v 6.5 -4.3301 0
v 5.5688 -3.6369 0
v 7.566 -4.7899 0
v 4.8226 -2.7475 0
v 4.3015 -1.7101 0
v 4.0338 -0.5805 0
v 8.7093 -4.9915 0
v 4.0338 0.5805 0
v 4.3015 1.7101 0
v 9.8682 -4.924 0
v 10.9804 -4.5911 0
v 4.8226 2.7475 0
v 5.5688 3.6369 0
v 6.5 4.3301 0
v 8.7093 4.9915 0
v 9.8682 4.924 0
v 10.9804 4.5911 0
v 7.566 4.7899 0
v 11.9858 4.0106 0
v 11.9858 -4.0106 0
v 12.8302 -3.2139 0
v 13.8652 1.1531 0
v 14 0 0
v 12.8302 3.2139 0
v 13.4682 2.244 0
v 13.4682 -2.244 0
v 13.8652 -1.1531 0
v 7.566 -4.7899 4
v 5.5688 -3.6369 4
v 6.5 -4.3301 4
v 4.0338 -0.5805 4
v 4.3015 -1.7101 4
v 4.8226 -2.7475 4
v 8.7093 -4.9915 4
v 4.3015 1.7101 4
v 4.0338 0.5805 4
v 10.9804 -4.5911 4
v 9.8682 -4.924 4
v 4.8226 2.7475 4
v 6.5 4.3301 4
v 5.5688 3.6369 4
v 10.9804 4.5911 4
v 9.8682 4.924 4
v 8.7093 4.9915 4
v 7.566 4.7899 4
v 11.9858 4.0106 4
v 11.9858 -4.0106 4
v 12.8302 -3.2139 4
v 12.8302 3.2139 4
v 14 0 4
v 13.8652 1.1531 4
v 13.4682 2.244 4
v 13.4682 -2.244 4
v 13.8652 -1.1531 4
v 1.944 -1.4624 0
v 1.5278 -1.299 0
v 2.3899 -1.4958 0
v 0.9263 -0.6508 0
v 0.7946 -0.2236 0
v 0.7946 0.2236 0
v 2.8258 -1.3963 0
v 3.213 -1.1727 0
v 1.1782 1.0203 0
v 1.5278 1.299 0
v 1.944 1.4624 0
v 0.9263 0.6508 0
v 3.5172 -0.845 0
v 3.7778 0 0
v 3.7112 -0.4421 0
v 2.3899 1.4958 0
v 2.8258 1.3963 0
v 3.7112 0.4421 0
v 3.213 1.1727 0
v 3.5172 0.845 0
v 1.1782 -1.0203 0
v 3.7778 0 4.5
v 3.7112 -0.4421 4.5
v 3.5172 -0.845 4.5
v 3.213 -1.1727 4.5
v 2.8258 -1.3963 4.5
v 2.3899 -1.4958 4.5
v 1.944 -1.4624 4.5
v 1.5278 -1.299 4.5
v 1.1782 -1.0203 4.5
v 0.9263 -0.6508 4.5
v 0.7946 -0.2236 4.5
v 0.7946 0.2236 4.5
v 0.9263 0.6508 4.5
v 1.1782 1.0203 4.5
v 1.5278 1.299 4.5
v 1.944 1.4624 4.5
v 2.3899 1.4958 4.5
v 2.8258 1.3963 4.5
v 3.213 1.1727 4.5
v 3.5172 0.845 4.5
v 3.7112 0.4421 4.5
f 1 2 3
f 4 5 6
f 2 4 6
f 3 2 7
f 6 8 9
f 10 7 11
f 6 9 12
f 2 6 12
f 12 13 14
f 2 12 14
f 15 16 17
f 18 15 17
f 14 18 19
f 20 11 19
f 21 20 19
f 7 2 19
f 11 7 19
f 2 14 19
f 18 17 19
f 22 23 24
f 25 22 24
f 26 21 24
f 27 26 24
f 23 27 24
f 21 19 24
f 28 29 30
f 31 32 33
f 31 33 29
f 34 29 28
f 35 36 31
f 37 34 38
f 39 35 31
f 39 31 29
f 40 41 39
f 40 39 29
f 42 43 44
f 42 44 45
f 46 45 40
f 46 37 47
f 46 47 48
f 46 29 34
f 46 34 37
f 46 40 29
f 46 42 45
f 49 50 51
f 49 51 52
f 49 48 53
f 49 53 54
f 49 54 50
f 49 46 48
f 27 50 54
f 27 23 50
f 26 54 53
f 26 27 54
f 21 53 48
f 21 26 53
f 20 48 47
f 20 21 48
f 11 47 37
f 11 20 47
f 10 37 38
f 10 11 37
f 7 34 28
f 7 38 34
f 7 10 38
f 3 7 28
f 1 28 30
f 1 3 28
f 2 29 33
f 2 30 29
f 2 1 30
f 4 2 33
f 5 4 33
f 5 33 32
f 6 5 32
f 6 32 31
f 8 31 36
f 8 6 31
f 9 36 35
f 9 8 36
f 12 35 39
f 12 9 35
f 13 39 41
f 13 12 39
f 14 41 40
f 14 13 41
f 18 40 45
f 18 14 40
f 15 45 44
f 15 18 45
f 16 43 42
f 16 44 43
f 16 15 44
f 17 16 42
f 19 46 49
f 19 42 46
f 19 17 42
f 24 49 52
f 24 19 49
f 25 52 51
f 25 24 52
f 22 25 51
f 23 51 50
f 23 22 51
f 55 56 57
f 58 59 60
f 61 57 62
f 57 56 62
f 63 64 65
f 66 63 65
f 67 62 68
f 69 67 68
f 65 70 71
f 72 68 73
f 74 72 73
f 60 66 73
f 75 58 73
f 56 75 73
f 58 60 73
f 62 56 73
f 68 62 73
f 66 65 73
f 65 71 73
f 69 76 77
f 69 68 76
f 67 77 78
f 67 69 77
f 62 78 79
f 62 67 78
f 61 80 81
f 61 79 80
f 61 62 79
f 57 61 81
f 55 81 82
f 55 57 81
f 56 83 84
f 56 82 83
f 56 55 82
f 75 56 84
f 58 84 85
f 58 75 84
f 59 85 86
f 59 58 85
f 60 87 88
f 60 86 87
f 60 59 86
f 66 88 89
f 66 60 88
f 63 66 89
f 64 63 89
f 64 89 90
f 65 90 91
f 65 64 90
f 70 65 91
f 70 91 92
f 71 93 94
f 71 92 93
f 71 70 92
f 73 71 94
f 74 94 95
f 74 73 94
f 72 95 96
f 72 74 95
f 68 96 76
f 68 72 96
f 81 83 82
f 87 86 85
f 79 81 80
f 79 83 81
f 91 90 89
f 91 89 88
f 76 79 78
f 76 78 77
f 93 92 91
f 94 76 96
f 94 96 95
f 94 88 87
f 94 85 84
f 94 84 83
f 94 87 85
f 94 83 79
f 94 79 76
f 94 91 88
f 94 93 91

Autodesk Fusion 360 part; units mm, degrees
sketch "Sketch1" plane through (0, 0, 0) normal (0, 0, 1) x (1, 0, 0)
  circle A0 centre (2.2778, 0) radius 1.5
  circle A1 centre (9, 0) radius 5
  dimension "d1" = 3
  dimension "d2" = 10
extrude "Extrude1" add sketch "Sketch1" along normal blind 2 makes body 1 at (10.3101, -1.9935, 0) makes body 2 at (3.7759, -0.0748, 1.3333)
extrude "Extrude2" add 1 faces at (2.7283, -0.3464, 2) along direction (0, 0, 1) blind 2.5 on bodies 2 bodies 2
extrude "Extrude3" add 1 faces at (10.3101, -1.9935, 2) along direction (0, 0, 1) blind 2 on bodies 1 bodies 1
